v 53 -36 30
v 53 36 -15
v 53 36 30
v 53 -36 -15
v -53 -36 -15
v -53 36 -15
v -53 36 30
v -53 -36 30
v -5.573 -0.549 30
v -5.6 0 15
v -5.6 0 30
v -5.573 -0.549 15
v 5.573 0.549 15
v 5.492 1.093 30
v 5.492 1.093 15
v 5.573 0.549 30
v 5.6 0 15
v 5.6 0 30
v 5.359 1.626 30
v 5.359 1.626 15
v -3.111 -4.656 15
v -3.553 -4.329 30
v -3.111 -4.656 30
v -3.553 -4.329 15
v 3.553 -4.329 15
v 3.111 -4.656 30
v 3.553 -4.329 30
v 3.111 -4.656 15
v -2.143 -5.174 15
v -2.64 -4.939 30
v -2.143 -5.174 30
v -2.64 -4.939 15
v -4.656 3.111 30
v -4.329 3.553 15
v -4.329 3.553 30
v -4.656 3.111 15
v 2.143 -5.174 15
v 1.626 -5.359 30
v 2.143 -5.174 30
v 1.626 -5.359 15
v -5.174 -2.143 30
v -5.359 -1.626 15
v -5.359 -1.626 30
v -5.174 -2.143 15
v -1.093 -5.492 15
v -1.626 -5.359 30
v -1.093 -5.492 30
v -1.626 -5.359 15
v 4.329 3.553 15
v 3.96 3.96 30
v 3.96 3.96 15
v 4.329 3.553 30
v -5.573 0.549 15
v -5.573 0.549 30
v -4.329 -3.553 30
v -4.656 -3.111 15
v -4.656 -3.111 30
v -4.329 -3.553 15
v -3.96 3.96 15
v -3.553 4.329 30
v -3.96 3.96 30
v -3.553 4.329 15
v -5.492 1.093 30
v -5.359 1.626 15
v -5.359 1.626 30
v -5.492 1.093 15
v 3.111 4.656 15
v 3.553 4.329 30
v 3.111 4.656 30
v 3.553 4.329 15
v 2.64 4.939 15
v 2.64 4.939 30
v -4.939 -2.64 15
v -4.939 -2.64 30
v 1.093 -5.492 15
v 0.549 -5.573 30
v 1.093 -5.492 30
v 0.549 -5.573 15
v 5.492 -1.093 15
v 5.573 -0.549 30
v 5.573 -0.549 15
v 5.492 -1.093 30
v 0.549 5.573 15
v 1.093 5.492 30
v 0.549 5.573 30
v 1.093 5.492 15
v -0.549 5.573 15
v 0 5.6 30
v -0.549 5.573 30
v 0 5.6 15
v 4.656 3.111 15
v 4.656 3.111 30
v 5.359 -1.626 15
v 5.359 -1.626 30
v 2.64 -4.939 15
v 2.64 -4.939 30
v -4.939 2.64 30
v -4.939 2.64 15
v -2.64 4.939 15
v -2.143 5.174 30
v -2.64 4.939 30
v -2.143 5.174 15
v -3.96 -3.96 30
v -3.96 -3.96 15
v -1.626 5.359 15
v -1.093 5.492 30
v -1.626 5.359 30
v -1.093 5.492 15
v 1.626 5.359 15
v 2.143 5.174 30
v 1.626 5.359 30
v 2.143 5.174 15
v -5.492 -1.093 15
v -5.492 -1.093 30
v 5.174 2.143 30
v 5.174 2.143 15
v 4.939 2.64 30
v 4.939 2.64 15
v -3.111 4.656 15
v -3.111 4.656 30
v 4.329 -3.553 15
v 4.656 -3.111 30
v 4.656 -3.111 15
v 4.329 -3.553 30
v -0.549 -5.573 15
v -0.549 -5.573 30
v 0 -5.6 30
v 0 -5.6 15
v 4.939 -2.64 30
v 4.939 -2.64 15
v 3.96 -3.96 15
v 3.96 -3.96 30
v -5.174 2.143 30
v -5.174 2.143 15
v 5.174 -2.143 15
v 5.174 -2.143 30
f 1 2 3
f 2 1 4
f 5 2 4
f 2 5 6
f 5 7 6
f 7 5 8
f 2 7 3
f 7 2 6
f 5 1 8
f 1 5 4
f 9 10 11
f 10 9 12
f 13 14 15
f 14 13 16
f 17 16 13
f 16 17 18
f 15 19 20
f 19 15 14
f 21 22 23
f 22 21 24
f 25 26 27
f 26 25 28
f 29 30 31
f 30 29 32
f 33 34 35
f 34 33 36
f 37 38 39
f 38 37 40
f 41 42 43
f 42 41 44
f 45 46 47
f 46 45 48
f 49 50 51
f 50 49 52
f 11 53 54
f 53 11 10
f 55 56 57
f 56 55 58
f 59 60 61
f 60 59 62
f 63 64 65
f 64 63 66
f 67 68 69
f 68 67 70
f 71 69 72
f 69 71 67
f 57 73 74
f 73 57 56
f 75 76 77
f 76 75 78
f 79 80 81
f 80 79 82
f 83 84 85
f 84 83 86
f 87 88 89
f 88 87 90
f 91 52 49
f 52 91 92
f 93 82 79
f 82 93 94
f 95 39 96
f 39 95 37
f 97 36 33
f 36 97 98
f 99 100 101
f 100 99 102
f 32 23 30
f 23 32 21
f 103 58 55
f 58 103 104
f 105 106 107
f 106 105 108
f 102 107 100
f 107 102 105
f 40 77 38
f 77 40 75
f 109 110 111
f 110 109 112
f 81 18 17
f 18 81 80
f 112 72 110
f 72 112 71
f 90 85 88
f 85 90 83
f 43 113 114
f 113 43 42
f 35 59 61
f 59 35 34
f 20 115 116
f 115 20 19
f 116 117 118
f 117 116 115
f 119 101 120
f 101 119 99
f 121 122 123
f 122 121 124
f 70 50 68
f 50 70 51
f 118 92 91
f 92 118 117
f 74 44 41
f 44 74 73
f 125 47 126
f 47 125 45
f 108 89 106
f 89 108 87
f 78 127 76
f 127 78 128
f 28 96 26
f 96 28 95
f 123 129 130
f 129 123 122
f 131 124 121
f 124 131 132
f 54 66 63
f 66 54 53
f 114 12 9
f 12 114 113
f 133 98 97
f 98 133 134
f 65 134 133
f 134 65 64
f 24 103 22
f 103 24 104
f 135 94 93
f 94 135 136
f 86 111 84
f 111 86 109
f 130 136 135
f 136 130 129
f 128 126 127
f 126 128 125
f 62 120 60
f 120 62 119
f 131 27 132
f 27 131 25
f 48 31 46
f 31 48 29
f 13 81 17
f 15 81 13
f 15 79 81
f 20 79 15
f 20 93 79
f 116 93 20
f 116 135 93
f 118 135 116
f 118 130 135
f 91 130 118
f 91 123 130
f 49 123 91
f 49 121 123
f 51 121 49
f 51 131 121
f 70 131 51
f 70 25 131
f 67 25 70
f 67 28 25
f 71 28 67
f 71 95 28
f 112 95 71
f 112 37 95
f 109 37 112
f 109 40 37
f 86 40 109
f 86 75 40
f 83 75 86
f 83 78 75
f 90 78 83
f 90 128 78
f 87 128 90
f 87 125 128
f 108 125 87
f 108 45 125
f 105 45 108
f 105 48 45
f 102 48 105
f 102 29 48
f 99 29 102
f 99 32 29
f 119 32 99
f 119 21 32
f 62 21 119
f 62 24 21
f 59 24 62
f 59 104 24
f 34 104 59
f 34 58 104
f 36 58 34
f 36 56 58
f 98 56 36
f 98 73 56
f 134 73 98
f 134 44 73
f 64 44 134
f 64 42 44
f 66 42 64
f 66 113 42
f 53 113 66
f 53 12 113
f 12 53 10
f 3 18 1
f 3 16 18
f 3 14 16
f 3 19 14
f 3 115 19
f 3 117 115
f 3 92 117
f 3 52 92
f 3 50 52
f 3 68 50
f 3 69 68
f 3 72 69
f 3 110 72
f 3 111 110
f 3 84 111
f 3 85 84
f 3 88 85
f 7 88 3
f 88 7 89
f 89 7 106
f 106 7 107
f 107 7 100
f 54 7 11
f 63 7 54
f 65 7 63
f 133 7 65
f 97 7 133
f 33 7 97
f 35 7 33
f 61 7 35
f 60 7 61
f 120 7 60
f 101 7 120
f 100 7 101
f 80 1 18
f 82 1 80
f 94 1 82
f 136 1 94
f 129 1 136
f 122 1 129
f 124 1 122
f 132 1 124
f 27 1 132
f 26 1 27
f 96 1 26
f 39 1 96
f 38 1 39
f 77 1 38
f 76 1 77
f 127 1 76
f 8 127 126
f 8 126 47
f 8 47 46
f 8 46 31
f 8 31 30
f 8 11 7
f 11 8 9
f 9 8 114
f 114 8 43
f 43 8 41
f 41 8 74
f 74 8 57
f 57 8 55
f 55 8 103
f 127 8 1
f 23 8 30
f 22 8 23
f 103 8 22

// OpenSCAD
// --- Dimensions (mm) ---
block_length = 106;      // X dimension
block_width = 72;        // Y dimension
block_height = 30;       // Z dimension

rows = 4;                // Number of rows along Y
cols = 6;                // Number of columns along X
spacing_x = 16;          // Center-to-center distance X
spacing_y = 16;          // Center-to-center distance Y

hole_diameter = 11.2;    // Diameter of the tube holes
hole_depth = 25;         // Depth of the holes
floor_thickness = 5;     // Thickness of the bottom solid part

// --- Internal Calculations ---
// Calculate the starting position to ensure the grid is centered
grid_width = (cols - 1) * spacing_x;
grid_height = (rows - 1) * spacing_y;

start_x = -(grid_width / 2);
start_y = -(grid_height / 2);

// Set resolution for curved surfaces
$fn = 64;

// --- Final Model ---
difference() {
    // The main rectangular block
    cube([block_length, block_width, block_height], center = true);

    // Create the holes
    // We use a nested loop to create the 4x6 grid
    for (i = [0 : cols - 1]) {
        for (j = [0 : rows - 1]) {
            // Calculate position for this specific hole
            // We add 0.01 to the Z translation to ensure it cuts through the top
            // We subtract the depth from the top surface
            // Since the cube is centered, the top surface is at Z = block_height/2
            
            translate(
                x = start_x + (i * spacing_x), 
                y = start_y + (j * spacing_y), 
                z = (block_height / 2) - hole_depth + 0.01 // Offset to ensure clean cut
            )
            cylinder(h = hole_depth + 0.1, d = hole_diameter);
        }
    }
}

// Note on Orientation:
// The block is centered on X and Y. 
// The bottom face of the block is at Z = -15 (half of 30).
// To print this resting on the XY plane at Z=0, 
// the user should translate the final object by [0, 0, 15] 
// or simply print as rendered if the slicer handles the offset.
// Per instructions, the block is centered on X/Y and rests on XY plane at Z=0.
// To achieve "rests on XY plane at Z=0" while being "centered on X and Y",
// we must translate the entire object up by half its height.

translate([0, 0, block_height/2]) {
    // This is a conceptual wrapper; the code above is the geometry.
    // To strictly follow "rests on XY plane at Z=0", 
    // we wrap the logic in a translate.
}

// Re-writing the structure to ensure it rests on Z=0 as requested
// while maintaining the centering logic.

module rack_geometry() {
    difference() {
        // Main block centered at 0,0,0
        cube([block_length, block_width, block_height], center = true);

        // Holes
        for (i = [0 : cols - 1]) {
            for (j = [0 : rows - 1]) {
                translate(
                    x = start_x + (i * spacing_x), 
                    y = start_y + (j * spacing_y), 
                    z = (block_height / 2) - hole_depth + 0.01
                )
                cylinder(h = hole_depth + 0.1, d = hole_diameter);
            }
        }
    }
}

// Final assembly: Move the centered block so the bottom face is at Z=0
translate([0, 0, block_height/2]) rack_geometry();
